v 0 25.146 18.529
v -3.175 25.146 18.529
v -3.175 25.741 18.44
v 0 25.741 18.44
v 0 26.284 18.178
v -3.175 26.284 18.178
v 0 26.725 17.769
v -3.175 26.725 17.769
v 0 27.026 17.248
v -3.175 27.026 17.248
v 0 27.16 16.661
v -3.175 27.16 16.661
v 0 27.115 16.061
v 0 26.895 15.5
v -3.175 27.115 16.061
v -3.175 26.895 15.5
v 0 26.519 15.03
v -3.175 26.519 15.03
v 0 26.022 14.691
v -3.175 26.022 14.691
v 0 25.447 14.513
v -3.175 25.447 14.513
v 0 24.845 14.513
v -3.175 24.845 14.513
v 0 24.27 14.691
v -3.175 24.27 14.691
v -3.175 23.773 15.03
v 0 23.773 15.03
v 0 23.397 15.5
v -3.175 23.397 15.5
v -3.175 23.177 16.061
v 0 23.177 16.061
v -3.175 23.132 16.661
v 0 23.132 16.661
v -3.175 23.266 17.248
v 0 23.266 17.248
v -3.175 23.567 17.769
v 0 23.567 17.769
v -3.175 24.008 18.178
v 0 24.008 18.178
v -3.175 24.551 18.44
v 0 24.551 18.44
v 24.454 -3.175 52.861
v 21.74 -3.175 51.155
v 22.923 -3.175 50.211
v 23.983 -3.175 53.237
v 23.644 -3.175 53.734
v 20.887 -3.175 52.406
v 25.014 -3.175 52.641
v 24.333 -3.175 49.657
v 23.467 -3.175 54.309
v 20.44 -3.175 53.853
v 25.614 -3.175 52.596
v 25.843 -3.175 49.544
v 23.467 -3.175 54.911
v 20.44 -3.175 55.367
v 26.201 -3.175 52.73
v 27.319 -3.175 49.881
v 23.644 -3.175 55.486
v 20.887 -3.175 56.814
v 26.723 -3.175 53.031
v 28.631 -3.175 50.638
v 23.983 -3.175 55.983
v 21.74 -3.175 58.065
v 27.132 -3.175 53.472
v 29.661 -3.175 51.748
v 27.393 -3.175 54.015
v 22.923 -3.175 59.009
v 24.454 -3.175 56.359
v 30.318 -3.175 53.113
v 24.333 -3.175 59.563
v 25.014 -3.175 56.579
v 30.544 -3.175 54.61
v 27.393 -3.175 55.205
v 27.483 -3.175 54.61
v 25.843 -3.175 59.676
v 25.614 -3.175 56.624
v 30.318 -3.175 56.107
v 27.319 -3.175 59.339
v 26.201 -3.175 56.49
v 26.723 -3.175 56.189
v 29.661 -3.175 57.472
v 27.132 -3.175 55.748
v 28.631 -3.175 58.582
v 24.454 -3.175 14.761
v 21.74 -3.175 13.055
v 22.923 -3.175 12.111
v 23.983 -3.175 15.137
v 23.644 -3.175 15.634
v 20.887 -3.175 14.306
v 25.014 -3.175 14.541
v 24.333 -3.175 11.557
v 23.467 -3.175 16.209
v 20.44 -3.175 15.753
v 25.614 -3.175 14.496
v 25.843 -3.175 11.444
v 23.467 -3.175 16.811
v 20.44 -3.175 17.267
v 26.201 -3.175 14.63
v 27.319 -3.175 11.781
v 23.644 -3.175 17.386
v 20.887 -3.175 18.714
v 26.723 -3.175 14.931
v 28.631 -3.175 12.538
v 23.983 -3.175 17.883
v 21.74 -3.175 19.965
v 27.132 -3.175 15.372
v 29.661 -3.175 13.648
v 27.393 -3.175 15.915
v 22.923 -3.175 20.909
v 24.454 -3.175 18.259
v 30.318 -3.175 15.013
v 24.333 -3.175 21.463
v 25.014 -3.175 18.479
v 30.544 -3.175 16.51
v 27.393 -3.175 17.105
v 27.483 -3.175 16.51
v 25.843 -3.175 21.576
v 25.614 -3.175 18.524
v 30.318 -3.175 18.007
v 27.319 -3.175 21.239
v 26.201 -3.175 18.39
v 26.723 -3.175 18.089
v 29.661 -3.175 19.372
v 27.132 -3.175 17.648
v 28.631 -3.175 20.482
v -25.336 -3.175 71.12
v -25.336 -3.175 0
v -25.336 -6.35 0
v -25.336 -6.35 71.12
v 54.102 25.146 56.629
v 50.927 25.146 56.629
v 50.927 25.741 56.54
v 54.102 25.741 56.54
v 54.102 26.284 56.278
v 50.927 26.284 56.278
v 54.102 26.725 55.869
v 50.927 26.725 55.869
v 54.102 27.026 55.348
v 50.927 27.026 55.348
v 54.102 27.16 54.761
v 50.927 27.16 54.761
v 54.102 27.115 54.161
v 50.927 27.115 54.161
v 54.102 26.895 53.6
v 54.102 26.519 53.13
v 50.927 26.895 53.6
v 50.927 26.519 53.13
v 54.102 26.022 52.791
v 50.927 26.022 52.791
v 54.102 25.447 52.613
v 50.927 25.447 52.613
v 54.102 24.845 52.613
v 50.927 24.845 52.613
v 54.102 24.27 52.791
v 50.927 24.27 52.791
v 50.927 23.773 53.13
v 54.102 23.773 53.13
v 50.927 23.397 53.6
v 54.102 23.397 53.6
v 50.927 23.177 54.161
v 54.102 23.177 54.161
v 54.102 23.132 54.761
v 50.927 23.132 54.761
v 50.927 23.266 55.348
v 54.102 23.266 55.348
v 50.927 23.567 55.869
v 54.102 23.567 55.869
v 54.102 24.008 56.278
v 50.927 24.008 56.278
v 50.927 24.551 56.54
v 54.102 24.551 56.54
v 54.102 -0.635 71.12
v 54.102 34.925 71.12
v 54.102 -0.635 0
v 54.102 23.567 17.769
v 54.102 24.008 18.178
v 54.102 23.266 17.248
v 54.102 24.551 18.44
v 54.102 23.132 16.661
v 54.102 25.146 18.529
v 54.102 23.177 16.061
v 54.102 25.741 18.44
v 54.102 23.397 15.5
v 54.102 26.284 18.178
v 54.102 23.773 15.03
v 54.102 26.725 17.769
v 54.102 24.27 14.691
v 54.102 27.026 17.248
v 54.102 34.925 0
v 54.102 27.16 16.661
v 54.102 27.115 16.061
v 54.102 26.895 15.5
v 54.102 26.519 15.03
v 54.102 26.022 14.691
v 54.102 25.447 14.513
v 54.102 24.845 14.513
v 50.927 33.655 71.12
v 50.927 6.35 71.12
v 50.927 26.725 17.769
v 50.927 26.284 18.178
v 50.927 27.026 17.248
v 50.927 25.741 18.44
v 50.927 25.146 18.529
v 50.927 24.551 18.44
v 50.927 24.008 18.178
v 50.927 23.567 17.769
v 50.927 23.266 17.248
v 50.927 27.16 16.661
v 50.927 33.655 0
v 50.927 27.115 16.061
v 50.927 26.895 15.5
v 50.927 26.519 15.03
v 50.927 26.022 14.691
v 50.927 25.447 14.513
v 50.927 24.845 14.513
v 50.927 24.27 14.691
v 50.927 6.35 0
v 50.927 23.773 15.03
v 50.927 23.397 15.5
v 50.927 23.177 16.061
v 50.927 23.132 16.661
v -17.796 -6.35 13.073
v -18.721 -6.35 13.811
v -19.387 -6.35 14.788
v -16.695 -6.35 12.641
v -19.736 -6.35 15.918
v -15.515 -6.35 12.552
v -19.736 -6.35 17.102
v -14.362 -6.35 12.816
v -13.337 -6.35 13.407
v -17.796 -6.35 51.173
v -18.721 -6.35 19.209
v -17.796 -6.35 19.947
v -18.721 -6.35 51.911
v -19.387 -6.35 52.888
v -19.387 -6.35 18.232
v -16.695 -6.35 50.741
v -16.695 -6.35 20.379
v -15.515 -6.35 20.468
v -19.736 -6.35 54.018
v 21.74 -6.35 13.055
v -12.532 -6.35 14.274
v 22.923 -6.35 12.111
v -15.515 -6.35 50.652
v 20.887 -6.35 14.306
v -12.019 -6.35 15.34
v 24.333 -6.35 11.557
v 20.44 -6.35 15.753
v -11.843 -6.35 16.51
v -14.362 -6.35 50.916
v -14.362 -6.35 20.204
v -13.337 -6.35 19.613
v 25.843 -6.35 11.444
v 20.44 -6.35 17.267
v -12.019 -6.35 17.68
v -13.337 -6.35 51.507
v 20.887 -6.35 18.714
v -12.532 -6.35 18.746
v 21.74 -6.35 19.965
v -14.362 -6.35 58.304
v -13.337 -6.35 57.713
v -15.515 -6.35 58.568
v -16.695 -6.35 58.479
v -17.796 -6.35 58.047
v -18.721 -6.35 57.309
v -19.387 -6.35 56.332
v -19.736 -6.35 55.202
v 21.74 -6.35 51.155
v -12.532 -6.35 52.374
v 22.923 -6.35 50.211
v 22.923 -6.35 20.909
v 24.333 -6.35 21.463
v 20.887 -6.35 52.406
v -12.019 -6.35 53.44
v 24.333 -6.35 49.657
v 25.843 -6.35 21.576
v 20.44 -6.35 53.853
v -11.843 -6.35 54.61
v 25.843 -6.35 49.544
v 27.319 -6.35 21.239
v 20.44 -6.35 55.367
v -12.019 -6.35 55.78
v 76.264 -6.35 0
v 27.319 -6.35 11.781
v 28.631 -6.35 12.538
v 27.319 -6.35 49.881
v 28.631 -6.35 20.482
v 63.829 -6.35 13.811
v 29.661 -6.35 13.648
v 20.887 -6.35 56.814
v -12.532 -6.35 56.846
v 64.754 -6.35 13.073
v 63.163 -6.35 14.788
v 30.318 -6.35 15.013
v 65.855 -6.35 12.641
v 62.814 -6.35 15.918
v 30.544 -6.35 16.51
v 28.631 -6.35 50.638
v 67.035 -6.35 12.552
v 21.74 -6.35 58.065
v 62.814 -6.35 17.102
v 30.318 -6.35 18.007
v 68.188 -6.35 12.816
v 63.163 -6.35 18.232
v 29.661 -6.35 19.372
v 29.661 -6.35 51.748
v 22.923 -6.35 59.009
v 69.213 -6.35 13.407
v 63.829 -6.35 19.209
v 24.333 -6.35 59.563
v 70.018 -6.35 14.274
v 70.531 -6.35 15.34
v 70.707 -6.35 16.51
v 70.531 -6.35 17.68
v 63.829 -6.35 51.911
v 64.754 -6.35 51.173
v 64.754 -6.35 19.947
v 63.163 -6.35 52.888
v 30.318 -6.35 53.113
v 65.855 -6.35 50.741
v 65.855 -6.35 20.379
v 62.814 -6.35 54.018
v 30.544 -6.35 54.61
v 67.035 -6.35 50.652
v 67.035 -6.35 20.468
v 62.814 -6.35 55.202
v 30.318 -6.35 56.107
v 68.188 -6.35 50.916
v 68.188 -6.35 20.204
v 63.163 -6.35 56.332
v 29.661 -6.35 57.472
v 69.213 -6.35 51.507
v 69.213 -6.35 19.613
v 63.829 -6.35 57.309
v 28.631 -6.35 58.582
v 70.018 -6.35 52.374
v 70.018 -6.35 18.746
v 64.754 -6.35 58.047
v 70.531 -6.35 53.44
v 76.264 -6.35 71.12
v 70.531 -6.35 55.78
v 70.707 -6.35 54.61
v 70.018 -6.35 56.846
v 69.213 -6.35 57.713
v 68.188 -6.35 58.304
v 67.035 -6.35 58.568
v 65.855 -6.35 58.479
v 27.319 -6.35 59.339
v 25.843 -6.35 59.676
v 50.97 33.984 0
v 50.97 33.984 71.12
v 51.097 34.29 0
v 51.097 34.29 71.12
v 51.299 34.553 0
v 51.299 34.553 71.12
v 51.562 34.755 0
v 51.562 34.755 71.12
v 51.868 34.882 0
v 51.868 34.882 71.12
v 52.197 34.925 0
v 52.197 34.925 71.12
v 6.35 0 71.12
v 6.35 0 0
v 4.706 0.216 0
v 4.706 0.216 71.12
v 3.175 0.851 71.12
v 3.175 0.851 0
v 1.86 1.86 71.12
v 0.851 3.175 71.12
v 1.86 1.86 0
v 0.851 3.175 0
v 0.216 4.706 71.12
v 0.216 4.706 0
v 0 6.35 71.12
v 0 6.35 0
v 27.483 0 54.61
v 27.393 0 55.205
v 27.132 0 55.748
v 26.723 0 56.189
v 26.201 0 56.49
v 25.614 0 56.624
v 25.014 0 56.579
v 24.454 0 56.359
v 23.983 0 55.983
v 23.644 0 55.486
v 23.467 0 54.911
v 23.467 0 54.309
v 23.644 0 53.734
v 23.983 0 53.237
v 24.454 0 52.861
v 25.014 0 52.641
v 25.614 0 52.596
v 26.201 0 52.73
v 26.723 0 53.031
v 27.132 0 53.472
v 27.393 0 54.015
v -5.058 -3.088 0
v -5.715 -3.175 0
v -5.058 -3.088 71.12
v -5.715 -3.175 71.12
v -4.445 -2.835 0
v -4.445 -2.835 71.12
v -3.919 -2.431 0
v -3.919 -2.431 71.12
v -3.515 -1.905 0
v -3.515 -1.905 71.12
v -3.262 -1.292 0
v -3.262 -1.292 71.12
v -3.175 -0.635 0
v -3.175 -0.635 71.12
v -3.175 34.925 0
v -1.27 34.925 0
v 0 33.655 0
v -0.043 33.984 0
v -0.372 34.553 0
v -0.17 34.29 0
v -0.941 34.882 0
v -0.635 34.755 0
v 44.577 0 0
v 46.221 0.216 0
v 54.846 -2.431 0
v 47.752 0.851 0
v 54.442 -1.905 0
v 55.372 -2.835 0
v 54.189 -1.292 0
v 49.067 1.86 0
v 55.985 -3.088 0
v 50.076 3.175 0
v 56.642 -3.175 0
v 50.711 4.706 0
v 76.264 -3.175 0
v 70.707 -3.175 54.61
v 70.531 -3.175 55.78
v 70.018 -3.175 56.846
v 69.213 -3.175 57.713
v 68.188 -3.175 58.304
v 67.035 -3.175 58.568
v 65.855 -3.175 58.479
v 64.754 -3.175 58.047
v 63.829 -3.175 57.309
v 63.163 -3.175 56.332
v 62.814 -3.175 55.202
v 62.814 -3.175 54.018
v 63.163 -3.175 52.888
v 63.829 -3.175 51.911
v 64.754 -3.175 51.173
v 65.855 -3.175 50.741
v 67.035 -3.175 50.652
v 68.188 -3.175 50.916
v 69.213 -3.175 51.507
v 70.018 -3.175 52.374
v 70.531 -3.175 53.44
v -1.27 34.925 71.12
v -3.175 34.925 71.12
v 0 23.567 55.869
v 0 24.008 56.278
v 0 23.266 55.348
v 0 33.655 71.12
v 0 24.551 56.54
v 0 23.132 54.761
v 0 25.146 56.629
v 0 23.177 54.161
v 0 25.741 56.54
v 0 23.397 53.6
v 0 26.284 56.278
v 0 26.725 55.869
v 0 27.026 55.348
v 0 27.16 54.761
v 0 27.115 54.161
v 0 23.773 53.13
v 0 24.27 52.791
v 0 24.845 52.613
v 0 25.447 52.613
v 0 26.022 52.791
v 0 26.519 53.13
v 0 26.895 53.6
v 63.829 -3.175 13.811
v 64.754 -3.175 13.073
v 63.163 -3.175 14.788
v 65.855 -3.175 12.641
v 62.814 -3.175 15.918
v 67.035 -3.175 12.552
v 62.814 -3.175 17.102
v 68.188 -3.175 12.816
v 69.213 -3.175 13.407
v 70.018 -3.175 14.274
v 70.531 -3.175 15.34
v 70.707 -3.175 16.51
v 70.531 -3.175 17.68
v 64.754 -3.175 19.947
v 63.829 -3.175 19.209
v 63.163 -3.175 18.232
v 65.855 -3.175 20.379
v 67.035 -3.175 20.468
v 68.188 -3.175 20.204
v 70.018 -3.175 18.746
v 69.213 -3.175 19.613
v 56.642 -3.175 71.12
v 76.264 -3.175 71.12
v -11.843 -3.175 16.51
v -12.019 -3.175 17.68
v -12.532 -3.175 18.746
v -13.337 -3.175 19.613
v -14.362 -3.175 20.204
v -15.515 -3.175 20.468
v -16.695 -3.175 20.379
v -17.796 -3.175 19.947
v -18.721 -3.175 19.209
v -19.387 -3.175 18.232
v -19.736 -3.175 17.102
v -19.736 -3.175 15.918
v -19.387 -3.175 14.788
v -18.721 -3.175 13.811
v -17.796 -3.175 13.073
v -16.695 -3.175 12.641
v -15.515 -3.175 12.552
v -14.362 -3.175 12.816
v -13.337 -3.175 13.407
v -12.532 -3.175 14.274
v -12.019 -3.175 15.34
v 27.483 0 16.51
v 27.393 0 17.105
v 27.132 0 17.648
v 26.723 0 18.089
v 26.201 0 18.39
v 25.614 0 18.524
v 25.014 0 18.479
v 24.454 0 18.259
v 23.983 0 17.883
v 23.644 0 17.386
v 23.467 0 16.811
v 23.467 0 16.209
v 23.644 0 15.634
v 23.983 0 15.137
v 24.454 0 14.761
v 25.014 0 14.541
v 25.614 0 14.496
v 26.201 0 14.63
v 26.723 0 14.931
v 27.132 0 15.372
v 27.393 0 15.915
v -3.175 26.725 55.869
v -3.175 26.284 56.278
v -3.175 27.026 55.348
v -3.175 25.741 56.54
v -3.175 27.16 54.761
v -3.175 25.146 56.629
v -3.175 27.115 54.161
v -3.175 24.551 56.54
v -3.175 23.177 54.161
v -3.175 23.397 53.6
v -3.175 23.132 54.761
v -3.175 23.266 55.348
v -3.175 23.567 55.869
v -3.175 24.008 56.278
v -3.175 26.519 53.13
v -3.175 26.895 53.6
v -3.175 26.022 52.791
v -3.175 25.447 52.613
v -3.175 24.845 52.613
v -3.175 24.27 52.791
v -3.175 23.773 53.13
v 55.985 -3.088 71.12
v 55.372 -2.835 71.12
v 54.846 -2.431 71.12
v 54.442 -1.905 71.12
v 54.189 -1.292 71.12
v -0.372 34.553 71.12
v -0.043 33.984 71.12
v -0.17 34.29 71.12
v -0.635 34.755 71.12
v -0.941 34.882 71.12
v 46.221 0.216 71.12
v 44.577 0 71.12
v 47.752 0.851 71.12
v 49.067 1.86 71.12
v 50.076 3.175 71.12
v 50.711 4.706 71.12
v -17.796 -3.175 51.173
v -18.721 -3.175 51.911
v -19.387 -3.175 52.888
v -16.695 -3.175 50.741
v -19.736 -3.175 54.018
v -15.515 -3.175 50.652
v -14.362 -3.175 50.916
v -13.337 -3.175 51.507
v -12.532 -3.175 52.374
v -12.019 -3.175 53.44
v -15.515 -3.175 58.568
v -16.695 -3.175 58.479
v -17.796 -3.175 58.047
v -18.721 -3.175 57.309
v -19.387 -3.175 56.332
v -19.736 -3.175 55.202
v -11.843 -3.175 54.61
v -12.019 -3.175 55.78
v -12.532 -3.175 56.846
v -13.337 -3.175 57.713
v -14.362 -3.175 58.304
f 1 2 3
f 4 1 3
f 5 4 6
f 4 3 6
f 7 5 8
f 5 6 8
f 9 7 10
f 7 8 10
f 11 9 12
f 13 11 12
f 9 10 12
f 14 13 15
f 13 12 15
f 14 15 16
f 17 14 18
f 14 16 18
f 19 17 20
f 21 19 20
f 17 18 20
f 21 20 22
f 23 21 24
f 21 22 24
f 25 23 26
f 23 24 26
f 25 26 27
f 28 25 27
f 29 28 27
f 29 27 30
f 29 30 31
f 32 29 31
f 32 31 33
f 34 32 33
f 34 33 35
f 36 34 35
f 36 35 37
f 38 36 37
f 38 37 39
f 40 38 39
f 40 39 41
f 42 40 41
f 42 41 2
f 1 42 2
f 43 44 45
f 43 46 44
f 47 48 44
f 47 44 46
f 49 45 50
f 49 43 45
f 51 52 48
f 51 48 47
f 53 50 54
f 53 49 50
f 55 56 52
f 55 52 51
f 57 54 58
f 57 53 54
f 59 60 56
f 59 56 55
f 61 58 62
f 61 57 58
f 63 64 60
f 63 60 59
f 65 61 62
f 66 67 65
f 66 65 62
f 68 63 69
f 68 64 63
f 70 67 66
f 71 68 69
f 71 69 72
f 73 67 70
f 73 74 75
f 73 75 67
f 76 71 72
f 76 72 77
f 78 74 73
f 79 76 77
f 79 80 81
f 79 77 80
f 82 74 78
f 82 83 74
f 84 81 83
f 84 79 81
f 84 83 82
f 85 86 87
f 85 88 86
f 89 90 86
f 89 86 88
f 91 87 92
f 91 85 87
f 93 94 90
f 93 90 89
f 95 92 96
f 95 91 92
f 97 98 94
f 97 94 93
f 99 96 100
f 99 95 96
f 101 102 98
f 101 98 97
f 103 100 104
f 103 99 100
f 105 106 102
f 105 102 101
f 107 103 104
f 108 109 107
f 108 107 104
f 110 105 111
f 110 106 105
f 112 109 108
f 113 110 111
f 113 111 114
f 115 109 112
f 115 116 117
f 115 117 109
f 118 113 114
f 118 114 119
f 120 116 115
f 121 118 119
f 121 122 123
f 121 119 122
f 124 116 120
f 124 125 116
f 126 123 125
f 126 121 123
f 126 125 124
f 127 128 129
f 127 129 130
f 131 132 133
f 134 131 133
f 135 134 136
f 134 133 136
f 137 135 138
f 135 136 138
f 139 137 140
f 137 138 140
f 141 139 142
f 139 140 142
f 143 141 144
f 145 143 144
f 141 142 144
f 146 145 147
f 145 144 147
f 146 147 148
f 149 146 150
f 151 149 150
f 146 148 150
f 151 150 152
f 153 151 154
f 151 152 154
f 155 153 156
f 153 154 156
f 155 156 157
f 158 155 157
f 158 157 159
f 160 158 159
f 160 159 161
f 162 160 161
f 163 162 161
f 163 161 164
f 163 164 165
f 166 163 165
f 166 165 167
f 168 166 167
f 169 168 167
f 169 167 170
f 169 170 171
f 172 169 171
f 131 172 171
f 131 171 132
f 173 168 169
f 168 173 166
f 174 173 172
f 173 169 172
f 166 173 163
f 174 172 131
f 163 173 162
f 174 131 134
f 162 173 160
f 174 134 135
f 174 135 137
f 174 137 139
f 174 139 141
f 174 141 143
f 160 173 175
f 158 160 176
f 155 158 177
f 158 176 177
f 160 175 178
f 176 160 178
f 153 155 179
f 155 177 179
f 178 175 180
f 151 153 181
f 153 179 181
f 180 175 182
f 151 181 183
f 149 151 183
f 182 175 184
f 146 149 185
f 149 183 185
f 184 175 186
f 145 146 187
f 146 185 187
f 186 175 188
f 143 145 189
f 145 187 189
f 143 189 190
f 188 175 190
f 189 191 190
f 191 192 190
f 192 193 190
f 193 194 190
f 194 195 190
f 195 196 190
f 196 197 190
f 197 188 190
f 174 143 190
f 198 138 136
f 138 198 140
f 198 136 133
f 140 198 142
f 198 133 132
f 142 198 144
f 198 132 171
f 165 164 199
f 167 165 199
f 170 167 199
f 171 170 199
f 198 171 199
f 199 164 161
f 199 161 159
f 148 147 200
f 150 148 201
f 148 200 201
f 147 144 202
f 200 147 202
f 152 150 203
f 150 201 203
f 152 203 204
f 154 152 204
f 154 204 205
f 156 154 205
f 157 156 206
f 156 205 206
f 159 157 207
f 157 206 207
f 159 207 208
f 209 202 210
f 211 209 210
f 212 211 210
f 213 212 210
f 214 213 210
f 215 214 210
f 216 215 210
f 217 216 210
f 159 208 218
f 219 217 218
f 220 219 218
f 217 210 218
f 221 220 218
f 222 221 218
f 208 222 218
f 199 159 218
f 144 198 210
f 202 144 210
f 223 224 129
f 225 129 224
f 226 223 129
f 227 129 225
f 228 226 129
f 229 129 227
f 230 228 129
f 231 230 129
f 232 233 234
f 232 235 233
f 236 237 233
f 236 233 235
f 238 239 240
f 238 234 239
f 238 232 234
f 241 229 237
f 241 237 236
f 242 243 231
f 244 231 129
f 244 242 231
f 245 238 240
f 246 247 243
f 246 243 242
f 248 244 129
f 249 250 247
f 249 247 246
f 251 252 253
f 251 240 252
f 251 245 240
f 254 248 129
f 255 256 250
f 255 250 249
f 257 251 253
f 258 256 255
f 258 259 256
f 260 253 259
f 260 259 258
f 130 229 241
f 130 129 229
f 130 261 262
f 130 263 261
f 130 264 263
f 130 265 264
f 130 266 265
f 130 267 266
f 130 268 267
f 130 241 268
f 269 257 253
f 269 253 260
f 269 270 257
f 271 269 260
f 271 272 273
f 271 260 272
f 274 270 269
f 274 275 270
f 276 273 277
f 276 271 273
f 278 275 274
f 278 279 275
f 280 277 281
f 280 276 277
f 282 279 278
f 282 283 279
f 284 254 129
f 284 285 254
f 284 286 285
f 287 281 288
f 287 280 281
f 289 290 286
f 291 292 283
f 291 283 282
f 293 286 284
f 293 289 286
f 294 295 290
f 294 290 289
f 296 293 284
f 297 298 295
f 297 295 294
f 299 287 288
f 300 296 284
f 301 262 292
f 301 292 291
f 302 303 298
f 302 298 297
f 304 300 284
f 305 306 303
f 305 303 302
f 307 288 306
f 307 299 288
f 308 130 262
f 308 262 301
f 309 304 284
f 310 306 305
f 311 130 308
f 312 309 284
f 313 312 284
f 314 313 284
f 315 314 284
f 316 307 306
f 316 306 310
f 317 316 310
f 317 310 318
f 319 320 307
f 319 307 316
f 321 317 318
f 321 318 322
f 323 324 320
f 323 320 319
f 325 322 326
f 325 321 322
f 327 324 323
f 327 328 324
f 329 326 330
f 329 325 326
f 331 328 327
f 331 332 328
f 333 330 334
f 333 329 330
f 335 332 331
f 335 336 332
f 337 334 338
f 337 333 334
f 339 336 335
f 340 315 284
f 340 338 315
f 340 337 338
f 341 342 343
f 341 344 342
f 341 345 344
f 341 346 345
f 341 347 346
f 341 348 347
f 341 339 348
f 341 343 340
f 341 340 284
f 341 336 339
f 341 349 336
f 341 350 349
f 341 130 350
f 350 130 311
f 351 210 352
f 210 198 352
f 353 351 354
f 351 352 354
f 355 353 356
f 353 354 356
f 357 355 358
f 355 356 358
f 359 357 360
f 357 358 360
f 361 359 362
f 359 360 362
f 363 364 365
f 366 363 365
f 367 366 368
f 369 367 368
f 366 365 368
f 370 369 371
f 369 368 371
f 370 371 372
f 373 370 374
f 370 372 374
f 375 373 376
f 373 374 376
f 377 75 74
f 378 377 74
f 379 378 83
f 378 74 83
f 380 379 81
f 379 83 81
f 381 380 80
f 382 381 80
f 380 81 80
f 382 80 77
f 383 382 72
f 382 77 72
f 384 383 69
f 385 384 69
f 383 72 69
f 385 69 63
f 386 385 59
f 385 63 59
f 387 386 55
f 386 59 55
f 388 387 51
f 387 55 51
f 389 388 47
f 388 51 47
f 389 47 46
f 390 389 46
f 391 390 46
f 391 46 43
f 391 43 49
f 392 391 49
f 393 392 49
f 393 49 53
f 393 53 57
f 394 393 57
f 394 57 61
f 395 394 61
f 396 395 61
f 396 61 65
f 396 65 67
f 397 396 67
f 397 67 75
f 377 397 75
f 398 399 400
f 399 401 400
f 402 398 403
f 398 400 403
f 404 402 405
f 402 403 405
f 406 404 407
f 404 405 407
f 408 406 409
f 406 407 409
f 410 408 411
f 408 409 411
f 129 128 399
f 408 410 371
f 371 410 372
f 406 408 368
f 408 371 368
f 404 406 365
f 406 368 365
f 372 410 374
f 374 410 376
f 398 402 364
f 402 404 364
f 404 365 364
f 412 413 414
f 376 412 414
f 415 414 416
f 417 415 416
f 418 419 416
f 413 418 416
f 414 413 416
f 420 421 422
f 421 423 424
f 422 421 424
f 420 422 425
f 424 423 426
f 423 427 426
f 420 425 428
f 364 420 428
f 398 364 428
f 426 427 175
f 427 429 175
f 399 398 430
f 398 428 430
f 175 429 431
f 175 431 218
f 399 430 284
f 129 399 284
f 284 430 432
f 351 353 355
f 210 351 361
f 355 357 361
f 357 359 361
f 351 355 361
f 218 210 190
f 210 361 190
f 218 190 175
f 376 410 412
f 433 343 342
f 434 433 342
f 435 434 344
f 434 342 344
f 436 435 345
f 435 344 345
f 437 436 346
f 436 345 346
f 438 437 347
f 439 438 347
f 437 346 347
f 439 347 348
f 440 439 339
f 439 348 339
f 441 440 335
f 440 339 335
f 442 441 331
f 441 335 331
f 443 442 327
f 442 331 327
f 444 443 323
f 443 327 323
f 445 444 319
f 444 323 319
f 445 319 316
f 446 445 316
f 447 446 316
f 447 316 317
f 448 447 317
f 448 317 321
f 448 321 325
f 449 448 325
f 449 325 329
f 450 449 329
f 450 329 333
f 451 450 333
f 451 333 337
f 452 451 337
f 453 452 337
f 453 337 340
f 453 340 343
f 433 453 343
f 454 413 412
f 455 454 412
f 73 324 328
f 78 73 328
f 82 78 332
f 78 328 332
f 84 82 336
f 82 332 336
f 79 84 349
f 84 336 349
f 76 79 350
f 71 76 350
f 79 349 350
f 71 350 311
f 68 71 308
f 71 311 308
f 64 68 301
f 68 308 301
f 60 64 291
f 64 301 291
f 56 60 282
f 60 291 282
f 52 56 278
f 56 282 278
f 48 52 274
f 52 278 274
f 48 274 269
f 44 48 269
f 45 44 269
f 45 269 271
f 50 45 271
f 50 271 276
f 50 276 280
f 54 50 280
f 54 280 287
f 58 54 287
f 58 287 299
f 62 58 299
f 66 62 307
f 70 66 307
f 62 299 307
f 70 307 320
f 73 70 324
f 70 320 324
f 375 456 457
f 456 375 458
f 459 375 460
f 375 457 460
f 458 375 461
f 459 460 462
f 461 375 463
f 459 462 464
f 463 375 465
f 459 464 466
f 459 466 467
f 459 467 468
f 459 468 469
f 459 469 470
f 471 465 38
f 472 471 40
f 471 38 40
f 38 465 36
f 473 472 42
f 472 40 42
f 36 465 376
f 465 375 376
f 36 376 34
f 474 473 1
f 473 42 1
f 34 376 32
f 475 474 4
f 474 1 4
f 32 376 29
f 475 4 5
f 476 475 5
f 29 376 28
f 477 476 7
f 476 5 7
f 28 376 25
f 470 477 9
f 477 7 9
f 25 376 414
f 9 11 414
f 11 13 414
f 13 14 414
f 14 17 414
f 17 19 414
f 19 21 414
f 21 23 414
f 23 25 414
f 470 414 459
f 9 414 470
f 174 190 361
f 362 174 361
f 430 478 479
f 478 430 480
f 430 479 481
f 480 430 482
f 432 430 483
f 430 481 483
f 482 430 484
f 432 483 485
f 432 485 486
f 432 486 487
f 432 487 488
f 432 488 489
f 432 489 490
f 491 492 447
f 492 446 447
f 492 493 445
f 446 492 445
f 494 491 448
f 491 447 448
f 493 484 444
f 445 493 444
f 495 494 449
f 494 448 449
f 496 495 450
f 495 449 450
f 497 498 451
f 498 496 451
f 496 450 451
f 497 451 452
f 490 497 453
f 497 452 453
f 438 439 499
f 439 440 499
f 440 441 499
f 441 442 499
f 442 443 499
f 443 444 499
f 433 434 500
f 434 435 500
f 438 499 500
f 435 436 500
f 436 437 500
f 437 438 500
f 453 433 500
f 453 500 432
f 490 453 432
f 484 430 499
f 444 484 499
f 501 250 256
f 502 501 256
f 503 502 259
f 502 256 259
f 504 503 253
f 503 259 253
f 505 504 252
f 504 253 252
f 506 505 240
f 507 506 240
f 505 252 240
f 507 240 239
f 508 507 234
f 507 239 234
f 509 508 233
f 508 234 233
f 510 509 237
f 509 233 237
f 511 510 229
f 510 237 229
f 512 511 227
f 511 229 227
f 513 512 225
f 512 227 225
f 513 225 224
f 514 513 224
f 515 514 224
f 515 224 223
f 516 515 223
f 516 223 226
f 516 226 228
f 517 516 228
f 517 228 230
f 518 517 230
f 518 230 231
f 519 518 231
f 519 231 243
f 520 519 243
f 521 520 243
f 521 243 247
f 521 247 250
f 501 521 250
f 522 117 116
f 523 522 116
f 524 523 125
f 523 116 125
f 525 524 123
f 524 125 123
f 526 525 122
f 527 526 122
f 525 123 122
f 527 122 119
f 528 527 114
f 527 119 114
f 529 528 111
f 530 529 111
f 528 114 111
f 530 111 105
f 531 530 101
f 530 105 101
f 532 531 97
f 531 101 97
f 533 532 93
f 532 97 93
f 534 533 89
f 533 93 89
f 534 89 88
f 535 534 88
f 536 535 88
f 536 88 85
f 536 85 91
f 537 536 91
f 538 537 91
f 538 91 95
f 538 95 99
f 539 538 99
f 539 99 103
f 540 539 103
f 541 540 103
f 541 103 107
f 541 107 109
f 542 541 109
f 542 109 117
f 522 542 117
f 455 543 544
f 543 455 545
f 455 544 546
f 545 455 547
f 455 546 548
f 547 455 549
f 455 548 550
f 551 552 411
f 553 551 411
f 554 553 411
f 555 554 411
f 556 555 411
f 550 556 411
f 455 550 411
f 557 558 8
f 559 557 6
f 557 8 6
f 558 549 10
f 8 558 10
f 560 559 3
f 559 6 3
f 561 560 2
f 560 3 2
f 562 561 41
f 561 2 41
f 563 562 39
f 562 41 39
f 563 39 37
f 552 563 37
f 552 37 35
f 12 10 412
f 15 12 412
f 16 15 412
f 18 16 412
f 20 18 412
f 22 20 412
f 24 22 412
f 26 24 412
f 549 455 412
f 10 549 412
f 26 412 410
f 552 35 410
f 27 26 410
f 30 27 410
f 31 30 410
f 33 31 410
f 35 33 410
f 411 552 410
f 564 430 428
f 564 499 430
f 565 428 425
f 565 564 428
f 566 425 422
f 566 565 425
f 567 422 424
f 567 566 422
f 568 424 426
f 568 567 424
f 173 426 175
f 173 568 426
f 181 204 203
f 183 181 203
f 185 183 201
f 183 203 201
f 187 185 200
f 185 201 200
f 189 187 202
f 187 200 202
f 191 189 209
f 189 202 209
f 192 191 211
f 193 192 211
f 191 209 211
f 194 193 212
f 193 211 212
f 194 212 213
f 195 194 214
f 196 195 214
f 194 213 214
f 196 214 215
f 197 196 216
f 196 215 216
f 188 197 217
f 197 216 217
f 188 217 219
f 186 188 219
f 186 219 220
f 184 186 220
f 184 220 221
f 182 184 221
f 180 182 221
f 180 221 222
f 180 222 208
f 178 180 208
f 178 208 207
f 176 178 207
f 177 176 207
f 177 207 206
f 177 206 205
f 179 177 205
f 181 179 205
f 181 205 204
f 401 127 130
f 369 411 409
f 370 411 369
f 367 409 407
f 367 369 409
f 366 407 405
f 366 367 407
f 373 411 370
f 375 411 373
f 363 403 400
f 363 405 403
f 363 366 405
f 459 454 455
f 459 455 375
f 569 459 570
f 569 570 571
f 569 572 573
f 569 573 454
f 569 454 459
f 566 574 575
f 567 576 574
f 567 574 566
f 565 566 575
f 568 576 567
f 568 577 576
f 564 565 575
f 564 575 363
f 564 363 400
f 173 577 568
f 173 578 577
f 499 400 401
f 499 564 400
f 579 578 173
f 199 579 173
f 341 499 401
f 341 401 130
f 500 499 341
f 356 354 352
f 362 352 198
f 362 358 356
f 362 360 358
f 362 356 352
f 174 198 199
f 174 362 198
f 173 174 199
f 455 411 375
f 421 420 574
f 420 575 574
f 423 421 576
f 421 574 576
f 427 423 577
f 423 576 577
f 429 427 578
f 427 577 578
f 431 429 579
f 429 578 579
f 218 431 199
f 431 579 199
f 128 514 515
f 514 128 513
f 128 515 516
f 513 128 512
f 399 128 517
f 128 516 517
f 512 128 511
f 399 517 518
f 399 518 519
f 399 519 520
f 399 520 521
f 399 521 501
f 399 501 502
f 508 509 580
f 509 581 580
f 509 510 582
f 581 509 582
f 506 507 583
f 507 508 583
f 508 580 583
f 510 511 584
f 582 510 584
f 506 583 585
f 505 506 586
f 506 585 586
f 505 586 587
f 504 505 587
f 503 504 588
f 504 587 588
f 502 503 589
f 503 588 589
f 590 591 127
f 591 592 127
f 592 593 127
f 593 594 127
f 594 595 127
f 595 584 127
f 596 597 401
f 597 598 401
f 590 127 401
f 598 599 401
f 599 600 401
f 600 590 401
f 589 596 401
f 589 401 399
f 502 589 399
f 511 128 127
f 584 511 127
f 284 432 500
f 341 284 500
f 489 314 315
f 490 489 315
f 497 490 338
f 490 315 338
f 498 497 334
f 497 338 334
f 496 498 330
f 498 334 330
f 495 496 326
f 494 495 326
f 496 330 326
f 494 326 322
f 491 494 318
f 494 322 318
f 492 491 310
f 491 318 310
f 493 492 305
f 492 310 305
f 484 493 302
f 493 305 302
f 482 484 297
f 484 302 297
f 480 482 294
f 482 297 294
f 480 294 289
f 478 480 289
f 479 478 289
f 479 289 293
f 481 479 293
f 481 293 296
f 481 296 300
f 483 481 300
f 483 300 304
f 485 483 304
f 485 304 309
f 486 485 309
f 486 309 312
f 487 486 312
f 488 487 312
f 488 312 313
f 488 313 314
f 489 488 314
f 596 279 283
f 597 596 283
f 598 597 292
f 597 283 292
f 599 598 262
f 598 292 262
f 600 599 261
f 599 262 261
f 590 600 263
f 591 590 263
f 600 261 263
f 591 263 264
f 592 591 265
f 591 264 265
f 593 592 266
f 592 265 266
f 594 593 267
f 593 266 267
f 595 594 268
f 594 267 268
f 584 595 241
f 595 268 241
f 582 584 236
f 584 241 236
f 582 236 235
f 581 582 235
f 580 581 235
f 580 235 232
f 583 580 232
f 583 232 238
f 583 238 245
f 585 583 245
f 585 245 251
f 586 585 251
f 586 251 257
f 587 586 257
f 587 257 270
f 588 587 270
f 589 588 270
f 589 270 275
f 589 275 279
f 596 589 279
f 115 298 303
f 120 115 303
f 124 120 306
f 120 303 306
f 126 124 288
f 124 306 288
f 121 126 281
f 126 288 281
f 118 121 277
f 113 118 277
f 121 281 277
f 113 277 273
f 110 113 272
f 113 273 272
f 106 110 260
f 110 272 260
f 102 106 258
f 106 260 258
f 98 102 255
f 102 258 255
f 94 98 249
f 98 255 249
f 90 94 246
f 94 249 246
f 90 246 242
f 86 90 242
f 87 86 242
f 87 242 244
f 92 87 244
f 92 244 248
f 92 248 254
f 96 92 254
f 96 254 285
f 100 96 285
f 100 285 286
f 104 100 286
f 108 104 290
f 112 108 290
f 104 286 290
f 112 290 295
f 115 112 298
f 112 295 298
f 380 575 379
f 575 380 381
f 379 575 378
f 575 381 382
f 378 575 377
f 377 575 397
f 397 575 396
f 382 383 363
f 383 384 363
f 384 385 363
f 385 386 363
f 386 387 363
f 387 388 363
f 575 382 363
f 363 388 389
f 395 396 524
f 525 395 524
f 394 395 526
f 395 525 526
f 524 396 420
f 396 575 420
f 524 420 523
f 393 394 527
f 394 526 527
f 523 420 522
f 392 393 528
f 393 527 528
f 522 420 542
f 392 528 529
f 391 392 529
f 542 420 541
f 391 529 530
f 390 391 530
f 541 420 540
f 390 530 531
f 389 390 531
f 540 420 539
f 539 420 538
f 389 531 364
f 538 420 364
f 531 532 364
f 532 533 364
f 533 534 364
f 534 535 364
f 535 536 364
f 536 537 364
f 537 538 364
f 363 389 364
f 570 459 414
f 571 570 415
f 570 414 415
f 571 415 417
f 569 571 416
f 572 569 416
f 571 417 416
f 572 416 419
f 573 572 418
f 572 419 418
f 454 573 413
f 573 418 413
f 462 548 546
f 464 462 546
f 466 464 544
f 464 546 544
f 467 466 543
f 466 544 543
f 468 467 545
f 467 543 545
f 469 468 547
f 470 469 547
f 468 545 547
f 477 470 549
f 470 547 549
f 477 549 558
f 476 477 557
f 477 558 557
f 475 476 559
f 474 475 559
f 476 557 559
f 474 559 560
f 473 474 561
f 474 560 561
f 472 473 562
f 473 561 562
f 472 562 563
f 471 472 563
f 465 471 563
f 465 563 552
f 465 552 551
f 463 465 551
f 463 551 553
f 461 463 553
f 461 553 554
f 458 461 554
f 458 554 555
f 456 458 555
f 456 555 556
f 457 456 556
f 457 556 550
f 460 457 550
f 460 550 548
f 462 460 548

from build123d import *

# Parameters (mm, degrees)
BOSS_EXTRUDE1_DEPTH = 71.12
SKETCH4_W           = 9.4615
SKETCH4_H           = 3.175
CUT_EXTRUDE1_DEPTH  = 72.12
BOSS_EXTRUDE2_DEPTH = 71.12
FILLET2_R           = 6.35
FILLET4_R           = 1.27
SKETCH6_W           = 101.6
SKETCH6_H           = 71.12
BOSS_EXTRUDE3_DEPTH = 3.175
SKETCH7_R           = 2.0193
CUT_EXTRUDE2_DEPTH  = 80.4385
SKETCH8_R           = 2.0193
CUT_EXTRUDE3_DEPTH  = 42.275
SKETCH9_R           = 3.96875
CUT_EXTRUDE4_DEPTH  = 42.275
FILLET5_R           = 2.54
SKETCH10_R          = 5.08
CUT_EXTRUDE5_DEPTH  = 3.175


with BuildPart() as part:
    # Sketch3 → Boss-Extrude1 (new body)
    with BuildSketch(Plane.XY):
        with BuildLine():
            Line((0, 6.35), (0, 33.655))
            ThreePointArc((0, 33.655), (-0.371974388, 34.553025612), (-1.27, 34.925))
            Line((-1.27, 34.925), (-3.175, 34.925))
            Line((-3.175, 34.925), (-3.175, 0))
            Line((-3.175, 0), (-3.175, -3.175))
            Line((-3.175, -3.175), (34.925, -3.175))
            Line((34.925, -3.175), (34.925, -1.27))
            ThreePointArc((34.925, -1.27), (34.553025612, -0.371974388), (33.655, 0))
            Line((33.655, 0), (6.35, 0))
            ThreePointArc((6.35, 0), (1.859871939, 1.859871939), (0, 6.35))
        make_face()
    extrude(amount=BOSS_EXTRUDE1_DEPTH)

    # Sketch4 → Cut-Extrude1 (cut, through all)
    with BuildSketch(Plane(origin=(0, 0, 0), x_dir=(-1, 0, 0), z_dir=(0, 0, -1))):
        with Locations((-30.19425, -1.5875)):
            Rectangle(SKETCH4_W, SKETCH4_H)
    extrude(amount=-CUT_EXTRUDE1_DEPTH, mode=Mode.SUBTRACT)

    # Sketch5 → Boss-Extrude2 (add)
    with BuildSketch(Plane(origin=(0, 0, 0), x_dir=(-1, 0, 0), z_dir=(0, 0, -1))):
        Polygon((-25.4635, -3.175), (-54.102, -3.175), (-54.102, 34.925), (-50.927, 34.925), (-50.927, 0), (-25.4635, 0), align=None)
    extrude(amount=-BOSS_EXTRUDE2_DEPTH)

    # Fillet2
    fillet2_edges = [part.edges().sort_by_distance(p)[0] for p in [
        (50.927, 0, 35.56),
    ]]
    fillet(fillet2_edges, radius=FILLET2_R)

    # Fillet4
    fillet4_edges = [part.edges().sort_by_distance(p)[0] for p in [
        (50.927, 34.925, 35.56),
    ]]
    fillet(fillet4_edges, radius=FILLET4_R)

    # Sketch6 → Boss-Extrude3 (add)
    with BuildSketch(Plane.XZ.offset(3.175)):
        with Locations((25.4635, 35.56)):
            Rectangle(SKETCH6_W, SKETCH6_H)
    extrude(amount=BOSS_EXTRUDE3_DEPTH)

    # Sketch7 → Cut-Extrude2 (cut, through all)
    with BuildSketch(Plane.ZY.offset(3.175)):
        with Locations((16.51, 25.146)):
            Circle(SKETCH7_R)
        with Locations((54.61, 25.146)):
            Circle(SKETCH7_R)
    extrude(amount=-CUT_EXTRUDE2_DEPTH, mode=Mode.SUBTRACT)

    # Sketch8 → Cut-Extrude3 (cut, through all)
    with BuildSketch(Plane.XZ.offset(6.35)):
        with Locations((25.4635, 16.51)):
            Circle(SKETCH8_R)
        with Locations((25.4635, 54.61)):
            Circle(SKETCH8_R)
    extrude(amount=-CUT_EXTRUDE3_DEPTH, mode=Mode.SUBTRACT)

    # Sketch9 → Cut-Extrude4 (cut, through all)
    with BuildSketch(Plane.XZ.offset(6.35)):
        with Locations((-15.8115, 16.51)):
            Circle(SKETCH9_R)
        with Locations((-15.8115, 54.61)):
            Circle(SKETCH9_R)
        with Locations((66.7385, 54.61)):
            Circle(SKETCH9_R)
        with Locations((66.7385, 16.51)):
            Circle(SKETCH9_R)
    extrude(amount=-CUT_EXTRUDE4_DEPTH, mode=Mode.SUBTRACT)

    # Fillet5
    fillet5_edges = [part.edges().sort_by_distance(p)[0] for p in [
        (-3.175, -3.175, 35.56),
        (54.102, -3.175, 35.56),
    ]]
    fillet(fillet5_edges, radius=FILLET5_R)

    # Sketch10 → Cut-Extrude5 (cut)
    with BuildSketch(Plane.XZ.offset(6.35)):
        with Locations((25.4635, 54.61)):
            Circle(SKETCH10_R)
        with Locations((25.4635, 16.51)):
            Circle(SKETCH10_R)
    extrude(amount=-CUT_EXTRUDE5_DEPTH, mode=Mode.SUBTRACT)


solid = part.part
